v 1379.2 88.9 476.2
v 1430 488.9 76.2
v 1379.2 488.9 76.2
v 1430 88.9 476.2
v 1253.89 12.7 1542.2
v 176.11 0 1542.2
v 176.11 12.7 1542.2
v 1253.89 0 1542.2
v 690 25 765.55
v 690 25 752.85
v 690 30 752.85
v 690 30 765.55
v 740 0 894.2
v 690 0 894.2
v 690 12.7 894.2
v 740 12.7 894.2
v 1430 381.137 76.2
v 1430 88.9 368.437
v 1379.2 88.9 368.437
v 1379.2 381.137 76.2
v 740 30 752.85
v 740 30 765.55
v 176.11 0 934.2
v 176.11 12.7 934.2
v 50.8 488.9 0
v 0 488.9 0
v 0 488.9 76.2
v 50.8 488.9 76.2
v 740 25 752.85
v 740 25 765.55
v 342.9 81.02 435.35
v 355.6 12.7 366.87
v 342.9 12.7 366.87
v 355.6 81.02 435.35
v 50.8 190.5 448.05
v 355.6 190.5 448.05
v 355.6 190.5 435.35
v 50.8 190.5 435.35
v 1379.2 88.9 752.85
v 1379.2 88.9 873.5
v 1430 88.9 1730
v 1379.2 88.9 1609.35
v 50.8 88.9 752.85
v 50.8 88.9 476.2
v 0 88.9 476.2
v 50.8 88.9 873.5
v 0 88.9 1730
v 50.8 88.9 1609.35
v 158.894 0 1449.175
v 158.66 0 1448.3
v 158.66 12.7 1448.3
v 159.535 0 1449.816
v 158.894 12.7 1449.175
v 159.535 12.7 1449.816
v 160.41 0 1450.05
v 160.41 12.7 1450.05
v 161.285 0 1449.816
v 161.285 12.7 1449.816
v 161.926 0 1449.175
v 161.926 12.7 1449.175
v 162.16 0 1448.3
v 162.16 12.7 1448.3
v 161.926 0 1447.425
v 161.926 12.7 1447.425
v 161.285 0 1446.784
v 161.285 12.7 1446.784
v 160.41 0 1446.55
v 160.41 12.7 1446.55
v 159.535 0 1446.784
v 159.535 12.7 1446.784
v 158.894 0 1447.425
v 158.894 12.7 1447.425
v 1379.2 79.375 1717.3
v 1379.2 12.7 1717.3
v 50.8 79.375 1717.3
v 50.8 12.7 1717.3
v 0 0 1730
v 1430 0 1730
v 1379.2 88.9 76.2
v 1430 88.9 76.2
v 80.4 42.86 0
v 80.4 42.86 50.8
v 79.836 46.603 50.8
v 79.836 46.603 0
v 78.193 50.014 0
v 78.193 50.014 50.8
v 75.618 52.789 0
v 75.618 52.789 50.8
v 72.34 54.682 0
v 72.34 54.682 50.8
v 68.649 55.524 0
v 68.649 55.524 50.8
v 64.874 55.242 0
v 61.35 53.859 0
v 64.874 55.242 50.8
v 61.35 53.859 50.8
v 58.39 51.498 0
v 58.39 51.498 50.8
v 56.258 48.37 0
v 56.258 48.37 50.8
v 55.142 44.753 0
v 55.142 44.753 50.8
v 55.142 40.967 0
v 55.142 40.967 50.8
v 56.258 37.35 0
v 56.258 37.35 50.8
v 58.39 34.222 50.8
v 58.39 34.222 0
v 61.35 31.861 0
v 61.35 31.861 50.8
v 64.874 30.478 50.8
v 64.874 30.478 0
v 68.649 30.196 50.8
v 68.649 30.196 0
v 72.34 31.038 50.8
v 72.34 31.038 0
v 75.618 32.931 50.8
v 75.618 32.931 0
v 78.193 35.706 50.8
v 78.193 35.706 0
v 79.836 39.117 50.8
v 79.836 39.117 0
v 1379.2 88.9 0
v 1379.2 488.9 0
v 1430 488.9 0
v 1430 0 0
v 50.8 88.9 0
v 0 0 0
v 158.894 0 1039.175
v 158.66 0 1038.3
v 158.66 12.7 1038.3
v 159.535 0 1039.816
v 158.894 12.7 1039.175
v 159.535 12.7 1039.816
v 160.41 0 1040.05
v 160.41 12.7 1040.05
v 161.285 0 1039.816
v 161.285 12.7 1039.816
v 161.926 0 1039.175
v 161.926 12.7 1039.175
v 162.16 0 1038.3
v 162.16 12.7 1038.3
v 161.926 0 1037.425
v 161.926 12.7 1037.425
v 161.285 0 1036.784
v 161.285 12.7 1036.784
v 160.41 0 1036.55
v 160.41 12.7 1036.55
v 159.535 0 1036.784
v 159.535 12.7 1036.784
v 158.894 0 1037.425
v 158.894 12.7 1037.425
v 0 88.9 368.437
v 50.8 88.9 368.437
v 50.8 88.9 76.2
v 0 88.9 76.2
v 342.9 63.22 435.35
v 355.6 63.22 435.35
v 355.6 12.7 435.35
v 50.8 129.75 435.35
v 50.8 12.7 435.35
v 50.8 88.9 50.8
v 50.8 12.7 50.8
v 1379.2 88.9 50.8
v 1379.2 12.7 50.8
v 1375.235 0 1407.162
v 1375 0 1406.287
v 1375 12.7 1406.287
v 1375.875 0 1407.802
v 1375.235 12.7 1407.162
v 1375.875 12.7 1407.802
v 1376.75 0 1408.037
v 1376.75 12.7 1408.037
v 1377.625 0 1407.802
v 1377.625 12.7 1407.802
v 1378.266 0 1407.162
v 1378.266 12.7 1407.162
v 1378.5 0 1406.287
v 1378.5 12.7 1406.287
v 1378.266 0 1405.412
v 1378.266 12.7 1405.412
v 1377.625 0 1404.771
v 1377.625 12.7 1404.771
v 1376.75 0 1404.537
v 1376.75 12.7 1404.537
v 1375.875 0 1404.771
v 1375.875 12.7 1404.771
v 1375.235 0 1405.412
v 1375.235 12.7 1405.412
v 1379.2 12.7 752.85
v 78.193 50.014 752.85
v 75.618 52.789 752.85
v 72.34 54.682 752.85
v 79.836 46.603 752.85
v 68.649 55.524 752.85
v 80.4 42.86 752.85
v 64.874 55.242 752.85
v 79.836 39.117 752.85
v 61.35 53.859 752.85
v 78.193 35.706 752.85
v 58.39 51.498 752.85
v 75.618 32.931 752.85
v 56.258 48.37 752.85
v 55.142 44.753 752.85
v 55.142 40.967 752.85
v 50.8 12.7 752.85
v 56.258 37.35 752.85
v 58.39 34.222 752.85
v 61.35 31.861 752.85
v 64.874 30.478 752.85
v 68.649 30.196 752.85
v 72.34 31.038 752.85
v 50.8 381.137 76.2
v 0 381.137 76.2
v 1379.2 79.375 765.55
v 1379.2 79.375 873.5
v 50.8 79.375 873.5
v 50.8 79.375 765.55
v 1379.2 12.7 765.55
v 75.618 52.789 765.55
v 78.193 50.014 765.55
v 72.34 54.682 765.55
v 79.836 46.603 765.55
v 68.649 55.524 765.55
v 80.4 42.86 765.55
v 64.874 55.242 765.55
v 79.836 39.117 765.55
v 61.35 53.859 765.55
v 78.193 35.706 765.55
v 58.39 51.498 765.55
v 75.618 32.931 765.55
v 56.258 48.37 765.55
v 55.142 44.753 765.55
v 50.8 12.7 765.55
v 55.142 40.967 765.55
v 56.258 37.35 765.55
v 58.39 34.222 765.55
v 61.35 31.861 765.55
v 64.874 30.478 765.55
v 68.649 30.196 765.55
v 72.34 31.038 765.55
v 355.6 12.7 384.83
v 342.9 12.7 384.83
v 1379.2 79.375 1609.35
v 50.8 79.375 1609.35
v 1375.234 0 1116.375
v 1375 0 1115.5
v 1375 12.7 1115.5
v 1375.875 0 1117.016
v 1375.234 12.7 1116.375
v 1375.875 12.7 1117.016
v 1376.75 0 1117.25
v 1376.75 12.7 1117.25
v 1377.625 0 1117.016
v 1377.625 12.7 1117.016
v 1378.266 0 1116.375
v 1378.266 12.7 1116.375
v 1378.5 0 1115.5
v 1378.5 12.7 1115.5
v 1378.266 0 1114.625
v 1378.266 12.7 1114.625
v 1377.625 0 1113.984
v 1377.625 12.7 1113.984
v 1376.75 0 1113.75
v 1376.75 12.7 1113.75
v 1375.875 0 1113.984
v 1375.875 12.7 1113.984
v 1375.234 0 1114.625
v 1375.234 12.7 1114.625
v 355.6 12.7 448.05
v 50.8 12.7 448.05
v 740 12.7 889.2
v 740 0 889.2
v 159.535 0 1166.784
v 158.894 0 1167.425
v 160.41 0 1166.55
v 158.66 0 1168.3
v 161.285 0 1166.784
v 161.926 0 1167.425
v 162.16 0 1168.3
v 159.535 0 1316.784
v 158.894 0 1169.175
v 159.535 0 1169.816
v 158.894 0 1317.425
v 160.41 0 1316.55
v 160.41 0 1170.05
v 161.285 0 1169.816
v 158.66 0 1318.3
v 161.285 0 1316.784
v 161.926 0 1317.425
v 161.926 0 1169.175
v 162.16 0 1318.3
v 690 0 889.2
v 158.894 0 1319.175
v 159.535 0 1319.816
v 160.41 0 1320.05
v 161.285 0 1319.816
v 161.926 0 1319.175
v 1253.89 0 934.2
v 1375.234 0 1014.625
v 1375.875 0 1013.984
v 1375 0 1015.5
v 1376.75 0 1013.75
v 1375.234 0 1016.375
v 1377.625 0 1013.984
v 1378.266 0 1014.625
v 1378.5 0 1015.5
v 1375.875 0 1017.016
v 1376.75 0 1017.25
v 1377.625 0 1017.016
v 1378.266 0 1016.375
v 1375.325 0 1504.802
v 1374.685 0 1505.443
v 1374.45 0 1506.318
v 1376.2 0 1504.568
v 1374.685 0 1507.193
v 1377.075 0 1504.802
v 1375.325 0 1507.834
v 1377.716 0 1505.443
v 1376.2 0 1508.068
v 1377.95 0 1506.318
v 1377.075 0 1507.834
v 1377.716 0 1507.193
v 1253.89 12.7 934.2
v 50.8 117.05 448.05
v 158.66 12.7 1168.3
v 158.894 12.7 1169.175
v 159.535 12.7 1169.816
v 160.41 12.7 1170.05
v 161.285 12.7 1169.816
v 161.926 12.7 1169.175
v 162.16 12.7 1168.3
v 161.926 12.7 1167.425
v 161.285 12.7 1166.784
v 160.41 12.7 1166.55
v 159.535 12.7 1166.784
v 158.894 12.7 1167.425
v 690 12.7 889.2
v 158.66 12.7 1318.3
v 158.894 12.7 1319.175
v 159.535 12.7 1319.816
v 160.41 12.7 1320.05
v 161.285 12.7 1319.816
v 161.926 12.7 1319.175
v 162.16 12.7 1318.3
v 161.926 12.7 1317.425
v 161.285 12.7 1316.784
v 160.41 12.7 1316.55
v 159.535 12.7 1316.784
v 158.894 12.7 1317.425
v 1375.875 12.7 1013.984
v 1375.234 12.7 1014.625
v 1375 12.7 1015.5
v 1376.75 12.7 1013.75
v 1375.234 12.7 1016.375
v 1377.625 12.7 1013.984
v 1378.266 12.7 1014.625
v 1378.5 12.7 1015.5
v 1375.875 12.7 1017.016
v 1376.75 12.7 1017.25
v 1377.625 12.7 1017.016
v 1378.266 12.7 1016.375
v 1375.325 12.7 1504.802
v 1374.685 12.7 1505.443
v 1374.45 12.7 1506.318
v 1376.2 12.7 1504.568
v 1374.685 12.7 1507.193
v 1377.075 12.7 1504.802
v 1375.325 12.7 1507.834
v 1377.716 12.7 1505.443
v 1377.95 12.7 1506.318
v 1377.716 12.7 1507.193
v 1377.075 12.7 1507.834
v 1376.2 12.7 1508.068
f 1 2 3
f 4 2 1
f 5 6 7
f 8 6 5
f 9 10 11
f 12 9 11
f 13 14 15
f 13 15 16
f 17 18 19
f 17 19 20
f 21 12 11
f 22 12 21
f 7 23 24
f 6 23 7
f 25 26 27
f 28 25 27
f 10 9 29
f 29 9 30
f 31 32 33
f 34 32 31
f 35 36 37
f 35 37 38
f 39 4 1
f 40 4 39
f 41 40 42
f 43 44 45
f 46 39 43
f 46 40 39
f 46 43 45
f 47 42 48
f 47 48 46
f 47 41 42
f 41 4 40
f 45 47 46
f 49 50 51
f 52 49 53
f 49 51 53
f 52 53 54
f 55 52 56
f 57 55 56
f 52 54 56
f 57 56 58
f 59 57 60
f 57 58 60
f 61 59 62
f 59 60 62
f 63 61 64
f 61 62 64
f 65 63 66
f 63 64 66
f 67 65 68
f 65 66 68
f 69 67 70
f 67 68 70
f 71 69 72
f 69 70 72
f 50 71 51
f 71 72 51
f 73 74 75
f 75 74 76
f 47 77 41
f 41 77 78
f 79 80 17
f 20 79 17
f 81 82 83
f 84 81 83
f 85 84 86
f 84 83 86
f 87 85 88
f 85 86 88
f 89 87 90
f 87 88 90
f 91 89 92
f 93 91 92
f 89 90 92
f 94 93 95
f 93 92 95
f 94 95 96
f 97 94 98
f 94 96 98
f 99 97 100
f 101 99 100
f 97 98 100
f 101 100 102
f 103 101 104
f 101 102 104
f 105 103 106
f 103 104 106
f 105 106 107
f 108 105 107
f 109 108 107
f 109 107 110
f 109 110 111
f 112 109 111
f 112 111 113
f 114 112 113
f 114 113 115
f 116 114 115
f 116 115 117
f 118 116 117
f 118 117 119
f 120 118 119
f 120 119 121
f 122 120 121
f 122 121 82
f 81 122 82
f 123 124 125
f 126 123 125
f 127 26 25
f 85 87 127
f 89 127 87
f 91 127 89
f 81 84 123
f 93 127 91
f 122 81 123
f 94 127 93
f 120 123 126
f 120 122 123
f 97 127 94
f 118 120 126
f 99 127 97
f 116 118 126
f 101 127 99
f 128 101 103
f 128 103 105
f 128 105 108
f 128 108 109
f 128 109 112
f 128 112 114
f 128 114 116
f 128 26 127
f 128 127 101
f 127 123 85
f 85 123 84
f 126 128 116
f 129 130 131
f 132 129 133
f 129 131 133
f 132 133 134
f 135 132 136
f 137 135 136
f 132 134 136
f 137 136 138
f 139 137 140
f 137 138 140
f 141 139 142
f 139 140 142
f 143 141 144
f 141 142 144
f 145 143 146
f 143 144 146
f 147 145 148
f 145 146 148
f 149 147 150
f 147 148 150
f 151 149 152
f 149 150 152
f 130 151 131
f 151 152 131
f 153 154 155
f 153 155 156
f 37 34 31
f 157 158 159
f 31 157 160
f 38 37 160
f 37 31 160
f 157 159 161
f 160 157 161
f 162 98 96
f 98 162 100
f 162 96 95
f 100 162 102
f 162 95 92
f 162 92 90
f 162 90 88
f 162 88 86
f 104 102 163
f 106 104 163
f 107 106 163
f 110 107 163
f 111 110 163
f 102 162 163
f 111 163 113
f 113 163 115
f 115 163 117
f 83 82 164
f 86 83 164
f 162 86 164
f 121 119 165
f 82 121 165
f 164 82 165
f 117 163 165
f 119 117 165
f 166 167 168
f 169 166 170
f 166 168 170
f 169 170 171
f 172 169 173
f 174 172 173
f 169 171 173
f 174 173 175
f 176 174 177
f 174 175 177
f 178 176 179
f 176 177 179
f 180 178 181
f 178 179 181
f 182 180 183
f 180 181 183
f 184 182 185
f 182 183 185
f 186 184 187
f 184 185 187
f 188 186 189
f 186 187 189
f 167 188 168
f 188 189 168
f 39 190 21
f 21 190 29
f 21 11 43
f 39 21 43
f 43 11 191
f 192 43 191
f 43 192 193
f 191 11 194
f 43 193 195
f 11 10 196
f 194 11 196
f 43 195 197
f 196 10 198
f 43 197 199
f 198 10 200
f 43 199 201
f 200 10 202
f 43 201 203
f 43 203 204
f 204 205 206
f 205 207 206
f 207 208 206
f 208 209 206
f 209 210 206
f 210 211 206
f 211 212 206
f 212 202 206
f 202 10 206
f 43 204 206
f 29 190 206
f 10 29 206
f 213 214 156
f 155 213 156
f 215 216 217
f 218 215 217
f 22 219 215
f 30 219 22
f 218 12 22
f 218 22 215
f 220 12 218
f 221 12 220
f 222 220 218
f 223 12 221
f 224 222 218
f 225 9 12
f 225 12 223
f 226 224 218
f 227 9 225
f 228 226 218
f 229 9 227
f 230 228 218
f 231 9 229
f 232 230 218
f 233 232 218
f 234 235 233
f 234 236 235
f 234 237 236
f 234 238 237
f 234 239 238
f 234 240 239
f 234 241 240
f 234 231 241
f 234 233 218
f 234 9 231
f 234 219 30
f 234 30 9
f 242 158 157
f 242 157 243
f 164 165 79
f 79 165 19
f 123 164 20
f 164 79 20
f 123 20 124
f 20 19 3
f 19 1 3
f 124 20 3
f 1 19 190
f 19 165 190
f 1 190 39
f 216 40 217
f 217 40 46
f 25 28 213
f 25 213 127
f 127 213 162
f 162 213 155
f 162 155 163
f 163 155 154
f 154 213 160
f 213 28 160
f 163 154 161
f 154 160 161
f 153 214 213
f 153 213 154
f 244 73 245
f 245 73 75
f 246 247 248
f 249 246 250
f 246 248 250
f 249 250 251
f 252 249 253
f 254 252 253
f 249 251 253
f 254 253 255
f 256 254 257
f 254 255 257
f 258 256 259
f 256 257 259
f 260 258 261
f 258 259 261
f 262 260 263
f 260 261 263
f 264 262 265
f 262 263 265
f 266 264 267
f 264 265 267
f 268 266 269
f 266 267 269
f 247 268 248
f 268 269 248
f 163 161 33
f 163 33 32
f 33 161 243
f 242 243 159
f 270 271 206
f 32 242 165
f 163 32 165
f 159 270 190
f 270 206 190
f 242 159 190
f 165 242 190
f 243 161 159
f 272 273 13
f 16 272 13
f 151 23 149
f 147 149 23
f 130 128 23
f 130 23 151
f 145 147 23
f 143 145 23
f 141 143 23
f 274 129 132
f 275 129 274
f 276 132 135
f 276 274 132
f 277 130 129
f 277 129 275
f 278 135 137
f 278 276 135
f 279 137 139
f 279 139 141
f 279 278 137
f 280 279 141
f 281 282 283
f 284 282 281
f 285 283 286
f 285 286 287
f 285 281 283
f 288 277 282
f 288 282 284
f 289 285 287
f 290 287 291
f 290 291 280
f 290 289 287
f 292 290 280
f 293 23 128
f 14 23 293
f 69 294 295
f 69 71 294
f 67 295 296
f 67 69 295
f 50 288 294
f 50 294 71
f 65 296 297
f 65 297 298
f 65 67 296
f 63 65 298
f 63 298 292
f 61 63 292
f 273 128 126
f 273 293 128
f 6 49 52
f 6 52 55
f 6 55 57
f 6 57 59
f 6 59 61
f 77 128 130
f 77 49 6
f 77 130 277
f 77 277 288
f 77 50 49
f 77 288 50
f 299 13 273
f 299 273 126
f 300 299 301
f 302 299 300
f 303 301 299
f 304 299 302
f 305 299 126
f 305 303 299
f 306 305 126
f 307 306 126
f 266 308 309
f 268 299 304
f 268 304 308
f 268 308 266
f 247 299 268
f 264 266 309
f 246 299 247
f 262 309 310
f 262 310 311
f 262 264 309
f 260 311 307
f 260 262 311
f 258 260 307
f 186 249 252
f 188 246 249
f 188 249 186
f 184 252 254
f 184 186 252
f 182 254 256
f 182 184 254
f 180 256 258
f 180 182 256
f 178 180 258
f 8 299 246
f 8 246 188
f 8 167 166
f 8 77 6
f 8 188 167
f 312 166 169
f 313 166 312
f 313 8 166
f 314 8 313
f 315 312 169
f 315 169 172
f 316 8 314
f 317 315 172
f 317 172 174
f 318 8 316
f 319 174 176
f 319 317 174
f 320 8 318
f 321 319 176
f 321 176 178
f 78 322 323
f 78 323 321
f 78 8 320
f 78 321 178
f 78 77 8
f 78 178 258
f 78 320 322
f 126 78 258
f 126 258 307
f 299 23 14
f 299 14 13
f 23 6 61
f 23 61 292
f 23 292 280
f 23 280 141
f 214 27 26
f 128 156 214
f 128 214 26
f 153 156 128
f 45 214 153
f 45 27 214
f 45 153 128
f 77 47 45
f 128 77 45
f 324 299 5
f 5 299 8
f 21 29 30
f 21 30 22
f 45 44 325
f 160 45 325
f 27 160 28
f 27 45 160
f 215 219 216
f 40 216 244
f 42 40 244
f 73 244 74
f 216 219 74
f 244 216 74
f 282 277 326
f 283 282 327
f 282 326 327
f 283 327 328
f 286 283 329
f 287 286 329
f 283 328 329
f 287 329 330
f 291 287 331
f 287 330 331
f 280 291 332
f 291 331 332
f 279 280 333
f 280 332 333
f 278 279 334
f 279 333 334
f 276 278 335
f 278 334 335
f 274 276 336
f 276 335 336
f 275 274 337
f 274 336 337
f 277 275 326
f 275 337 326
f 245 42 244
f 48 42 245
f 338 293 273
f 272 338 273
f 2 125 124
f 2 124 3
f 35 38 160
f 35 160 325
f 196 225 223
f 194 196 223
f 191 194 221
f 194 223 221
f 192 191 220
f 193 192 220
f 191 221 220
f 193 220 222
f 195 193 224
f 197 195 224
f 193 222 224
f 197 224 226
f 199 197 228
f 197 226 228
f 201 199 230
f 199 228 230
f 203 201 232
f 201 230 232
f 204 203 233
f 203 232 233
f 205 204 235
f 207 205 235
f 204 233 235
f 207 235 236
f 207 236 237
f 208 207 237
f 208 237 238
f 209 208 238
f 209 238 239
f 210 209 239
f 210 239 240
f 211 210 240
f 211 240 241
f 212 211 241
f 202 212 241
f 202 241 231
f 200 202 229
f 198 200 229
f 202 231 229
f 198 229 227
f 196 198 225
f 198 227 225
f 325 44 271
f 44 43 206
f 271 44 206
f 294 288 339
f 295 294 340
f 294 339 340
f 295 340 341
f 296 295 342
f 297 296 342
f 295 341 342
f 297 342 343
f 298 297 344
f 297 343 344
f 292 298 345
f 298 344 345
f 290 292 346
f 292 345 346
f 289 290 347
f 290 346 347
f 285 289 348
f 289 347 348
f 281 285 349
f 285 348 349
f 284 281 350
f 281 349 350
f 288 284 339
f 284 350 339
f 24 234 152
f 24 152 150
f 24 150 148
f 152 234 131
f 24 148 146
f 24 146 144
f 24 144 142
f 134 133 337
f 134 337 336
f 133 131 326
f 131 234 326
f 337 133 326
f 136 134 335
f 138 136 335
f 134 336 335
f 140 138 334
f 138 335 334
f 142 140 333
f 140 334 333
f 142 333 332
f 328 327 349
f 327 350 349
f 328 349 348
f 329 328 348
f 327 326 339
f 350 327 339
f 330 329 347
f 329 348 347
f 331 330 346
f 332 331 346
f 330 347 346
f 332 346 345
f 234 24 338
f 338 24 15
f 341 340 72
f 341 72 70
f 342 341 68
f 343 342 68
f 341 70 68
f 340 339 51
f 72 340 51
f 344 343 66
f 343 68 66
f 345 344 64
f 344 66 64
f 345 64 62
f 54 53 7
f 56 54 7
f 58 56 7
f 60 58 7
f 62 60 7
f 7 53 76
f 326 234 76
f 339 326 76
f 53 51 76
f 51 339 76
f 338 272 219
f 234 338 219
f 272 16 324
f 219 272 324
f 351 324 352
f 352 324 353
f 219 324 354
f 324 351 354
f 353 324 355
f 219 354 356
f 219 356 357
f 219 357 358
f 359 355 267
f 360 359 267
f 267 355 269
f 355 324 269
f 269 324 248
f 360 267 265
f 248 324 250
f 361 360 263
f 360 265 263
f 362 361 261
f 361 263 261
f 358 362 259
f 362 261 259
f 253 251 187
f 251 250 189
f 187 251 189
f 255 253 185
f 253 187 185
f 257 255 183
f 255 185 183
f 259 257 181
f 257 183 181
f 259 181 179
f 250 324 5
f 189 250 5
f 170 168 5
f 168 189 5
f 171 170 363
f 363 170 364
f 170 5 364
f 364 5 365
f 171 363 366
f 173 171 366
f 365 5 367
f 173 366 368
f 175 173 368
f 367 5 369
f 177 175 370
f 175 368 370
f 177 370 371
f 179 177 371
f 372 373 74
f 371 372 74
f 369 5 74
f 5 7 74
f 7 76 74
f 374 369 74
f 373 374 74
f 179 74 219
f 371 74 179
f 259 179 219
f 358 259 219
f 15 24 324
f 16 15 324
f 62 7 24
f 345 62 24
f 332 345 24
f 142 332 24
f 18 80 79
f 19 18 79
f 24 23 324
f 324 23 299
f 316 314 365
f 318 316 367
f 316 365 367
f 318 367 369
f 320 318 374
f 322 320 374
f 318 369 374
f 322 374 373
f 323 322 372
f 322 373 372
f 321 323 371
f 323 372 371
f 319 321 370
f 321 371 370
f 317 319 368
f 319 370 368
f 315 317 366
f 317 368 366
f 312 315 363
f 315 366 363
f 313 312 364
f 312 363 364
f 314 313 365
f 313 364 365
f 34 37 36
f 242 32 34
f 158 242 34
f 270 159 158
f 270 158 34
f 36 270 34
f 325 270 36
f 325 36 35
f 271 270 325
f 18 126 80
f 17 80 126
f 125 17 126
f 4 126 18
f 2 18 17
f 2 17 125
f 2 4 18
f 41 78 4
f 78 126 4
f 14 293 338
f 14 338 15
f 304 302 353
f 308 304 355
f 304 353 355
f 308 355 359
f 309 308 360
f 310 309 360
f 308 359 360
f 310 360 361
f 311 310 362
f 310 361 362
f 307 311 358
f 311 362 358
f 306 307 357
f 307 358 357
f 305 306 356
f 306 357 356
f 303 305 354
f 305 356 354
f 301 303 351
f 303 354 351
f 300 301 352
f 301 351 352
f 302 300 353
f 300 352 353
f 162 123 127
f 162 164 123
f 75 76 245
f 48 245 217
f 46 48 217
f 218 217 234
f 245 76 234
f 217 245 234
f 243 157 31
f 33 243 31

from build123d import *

# Parameters (mm, degrees)
F0_W      = 1430
F0_H      = 1730
F0_W_2    = 50
F0_H_2    = 5
F0_W_3    = 1077.78
F0_H_3    = 608
F1_DEPTH  = 12.7
F2_W      = 664.2
F2_H      = 12.7
F2_W_2    = 50.8
F2_H_2    = 50.8
F3_DEPTH  = 76.2
F4_W      = 1328.4
F4_H      = 12.7
F5_DEPTH  = 76.2
F6_W      = 1379.2
F6_H      = 120.65
F6_W_2    = 1328.4
F6_H_2    = 107.95
F7_DEPTH  = 9.525
F8_W      = 400
F8_H      = 76.2
F9_DEPTH  = 50.8
F11_DEPTH = 50.8
F12_R     = 12.7
F12_W     = 50
F12_H     = 5
F13_DEPTH = 12.7
F15_W     = 400
F15_H     = 76.2
F16_DEPTH = 50.8
F18_DEPTH = 50.8
F19_R     = 1.75
F20_DEPTH = 12.701
F14_R     = 12.7
F21_DEPTH = 50.801
F22_W     = 304.8
F22_H     = 12.7
F23_DEPTH = 177.8
F25_DEPTH = 12.7


with BuildPart() as f1:
    # F0 (on Front) → F1 (new body)
    with BuildSketch(Plane.XZ):
        with Locations((715, 865)):
            Rectangle(F0_W, F0_H)
        with Locations((715, 891.7)):
            Rectangle(F0_W_2, F0_H_2, mode=Mode.SUBTRACT)
        with Locations((715, 1238.2)):
            Rectangle(F0_W_3, F0_H_3, mode=Mode.SUBTRACT)
    extrude(amount=-F1_DEPTH)

    # F2 (on face) → F3 (join)
    with BuildSketch(Plane(origin=(0, 12.7, 0), x_dir=(-1, 0, 0), z_dir=(0, 1, 0))):
        with Locations((-1047.1, 1723.65)):
            Rectangle(F2_W, F2_H)
        with Locations((-1404.6, 1723.65)):
            Rectangle(F2_W_2, F2_H)
        Polygon((-1379.2, 50.8), (-1379.2, 1717.3), (-1430, 1717.3), (-1430, 737.95), (-1430, 718.9), (-1430, 50.8), align=None)
        with Locations((-382.9, 1723.65)):
            Rectangle(F2_W, F2_H)
        with Locations((-1047.1, 25.4)):
            Rectangle(F2_W, F2_H_2)
        with Locations((-1404.6, 25.4)):
            Rectangle(F2_W_2, F2_H_2)
        with Locations((-25.4, 1723.65)):
            Rectangle(F2_W_2, F2_H)
        with Locations((-382.9, 25.4)):
            Rectangle(F2_W, F2_H_2)
        Polygon((0, 1717.3), (-50.8, 1717.3), (-50.8, 50.8), (0, 50.8), (0, 718.9), (0, 737.95), align=None)
        with Locations((-25.4, 25.4)):
            Rectangle(F2_W_2, F2_H_2)
    extrude(amount=F3_DEPTH)

    # F4 (on face) → F5 (join)
    with BuildSketch(Plane(origin=(0, 12.7, 0), x_dir=(-1, 0, 0), z_dir=(0, 1, 0))):
        with Locations((-715, 759.2)):
            Rectangle(F4_W, F4_H)
    extrude(amount=F5_DEPTH)

    # F6 (on face) → F7 (join)
    with BuildSketch(Plane(origin=(0, 88.9, 0), x_dir=(-1, 0, 0), z_dir=(0, 1, 0))):
        with Locations((-740.4, 1669.675)):
            Rectangle(F6_W, F6_H)
        with Locations((-715, 819.525)):
            Rectangle(F6_W_2, F6_H_2)
    extrude(amount=-F7_DEPTH)

    # F8 (on face) → F9 (join)
    with BuildSketch(Plane.YZ.offset(1430)):
        with Locations((288.9, 38.1)):
            Rectangle(F8_W, F8_H)
    extrude(amount=-F9_DEPTH)

    # F10 (on face) → F11 (join)
    with BuildSketch(Plane.YZ.offset(1430)):
        Polygon((381.1369265472, 76.2), (488.9, 76.2), (88.9, 476.2), (88.9, 368.4369265472), align=None)
    extrude(amount=-F11_DEPTH)

    # F12 (on face) → F13 (cut, through all)
    with BuildSketch(Plane.XY.offset(765.55)):
        with Locations((67.7, 42.86)):
            Circle(F12_R)
        with Locations((715, 27.5)):
            Rectangle(F12_W, F12_H)
    extrude(amount=-F13_DEPTH, mode=Mode.SUBTRACT)

    # F15 (on face) → F16 (join)
    with BuildSketch(Plane(origin=(0, 0, 0), x_dir=(0, -1, 0), z_dir=(-1, 0, 0))):
        with Locations((-288.9, 38.1)):
            Rectangle(F15_W, F15_H)
    extrude(amount=-F16_DEPTH)

    # F17 (on face) → F18 (join)
    with BuildSketch(Plane(origin=(0, 0, 0), x_dir=(0, -1, 0), z_dir=(-1, 0, 0))):
        Polygon((-88.9, 476.2), (-488.9, 76.2), (-381.1369265472, 76.2), (-88.9, 368.4369265472), align=None)
    extrude(amount=-F18_DEPTH)

    # F19 (on face) → F20 (cut, through all)
    with BuildSketch(Plane(origin=(0, 12.7, 0), x_dir=(-1, 0, 0), z_dir=(0, 1, 0))):
        with Locations((-1376.7500453753, 1406.2865250229)):
            Circle(F19_R)
        with Locations((-1376.2000453753, 1506.3180125114)):
            Circle(F19_R)
        with Locations((-1376.75, 1115.5)):
            Circle(F19_R)
        with Locations((-1376.75, 1015.5)):
            Circle(F19_R)
        with Locations((-160.41, 1448.3)):
            Circle(F19_R)
        with Locations((-160.41, 1318.3)):
            Circle(F19_R)
        with Locations((-160.41, 1168.3)):
            Circle(F19_R)
        with Locations((-160.41, 1038.3)):
            Circle(F19_R)
    extrude(amount=-F20_DEPTH, mode=Mode.SUBTRACT)

    # F14 (on face) → F21 (cut, through all)
    with BuildSketch(Plane.XY.offset(50.8)):
        with Locations((67.7, 42.86)):
            Circle(F14_R)
    extrude(amount=-F21_DEPTH, mode=Mode.SUBTRACT)

    # F22 (on face) → F23 (join)
    with BuildSketch(Plane(origin=(0, 12.7, 0), x_dir=(-1, 0, 0), z_dir=(0, 1, 0))):
        with Locations((-203.2, 441.7)):
            Rectangle(F22_W, F22_H)
    extrude(amount=F23_DEPTH)

    # F24 (on face) → F25 (join)
    with BuildSketch(Plane.YZ.offset(355.6)):
        Polygon((81.0198792071, 435.35), (63.2197438789, 435.35), (12.7, 384.8302561211), (12.7, 375.85), (12.7, 366.8697438789), align=None)
    extrude(amount=-F25_DEPTH)


solid = f1.part
